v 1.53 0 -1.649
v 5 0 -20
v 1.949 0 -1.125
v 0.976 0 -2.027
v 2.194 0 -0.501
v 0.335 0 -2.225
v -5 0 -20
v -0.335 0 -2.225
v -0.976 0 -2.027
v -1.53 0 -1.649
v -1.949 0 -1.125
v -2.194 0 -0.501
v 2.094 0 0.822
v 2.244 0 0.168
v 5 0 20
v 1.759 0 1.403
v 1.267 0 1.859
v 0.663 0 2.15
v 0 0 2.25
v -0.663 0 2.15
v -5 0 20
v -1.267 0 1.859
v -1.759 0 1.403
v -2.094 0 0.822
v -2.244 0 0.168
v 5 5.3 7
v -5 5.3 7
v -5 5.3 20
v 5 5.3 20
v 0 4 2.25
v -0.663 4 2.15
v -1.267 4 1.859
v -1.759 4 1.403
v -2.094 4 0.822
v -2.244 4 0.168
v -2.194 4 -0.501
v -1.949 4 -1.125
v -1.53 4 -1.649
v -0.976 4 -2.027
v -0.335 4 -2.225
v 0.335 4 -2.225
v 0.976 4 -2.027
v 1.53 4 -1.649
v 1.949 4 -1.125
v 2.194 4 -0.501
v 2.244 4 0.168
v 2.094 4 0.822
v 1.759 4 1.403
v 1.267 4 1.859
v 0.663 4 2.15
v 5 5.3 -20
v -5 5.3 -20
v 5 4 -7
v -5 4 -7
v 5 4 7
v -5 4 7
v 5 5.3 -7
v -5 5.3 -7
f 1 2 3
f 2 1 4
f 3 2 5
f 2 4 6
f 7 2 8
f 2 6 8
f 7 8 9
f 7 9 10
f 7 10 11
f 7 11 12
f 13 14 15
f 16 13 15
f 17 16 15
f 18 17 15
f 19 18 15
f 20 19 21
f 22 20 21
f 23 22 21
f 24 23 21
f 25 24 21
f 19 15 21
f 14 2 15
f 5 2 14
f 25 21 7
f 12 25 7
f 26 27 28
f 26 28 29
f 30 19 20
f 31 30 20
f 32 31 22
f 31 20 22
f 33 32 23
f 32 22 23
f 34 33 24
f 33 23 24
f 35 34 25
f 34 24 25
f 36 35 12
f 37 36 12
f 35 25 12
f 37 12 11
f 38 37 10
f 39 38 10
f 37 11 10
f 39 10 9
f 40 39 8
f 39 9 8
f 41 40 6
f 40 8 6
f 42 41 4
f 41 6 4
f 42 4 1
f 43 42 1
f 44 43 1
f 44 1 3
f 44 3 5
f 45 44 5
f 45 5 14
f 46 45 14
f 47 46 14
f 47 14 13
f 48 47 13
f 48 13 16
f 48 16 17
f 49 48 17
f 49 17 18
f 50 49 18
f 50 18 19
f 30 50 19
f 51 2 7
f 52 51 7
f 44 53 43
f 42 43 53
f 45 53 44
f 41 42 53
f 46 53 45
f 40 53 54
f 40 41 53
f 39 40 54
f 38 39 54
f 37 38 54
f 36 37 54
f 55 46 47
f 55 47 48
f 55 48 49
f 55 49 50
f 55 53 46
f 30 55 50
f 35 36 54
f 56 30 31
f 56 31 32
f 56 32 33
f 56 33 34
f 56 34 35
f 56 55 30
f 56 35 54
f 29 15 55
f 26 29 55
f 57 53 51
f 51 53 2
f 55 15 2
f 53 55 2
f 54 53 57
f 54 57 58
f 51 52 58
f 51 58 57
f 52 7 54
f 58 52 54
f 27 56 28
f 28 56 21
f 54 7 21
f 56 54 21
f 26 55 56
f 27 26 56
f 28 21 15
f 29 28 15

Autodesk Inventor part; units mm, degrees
ref_plane "YZ Plane" through (0, 0, 0) normal (1, 0, 0) x (0, 1, 0)
ref_plane "XZ Plane" through (0, 0, 0) normal (0, 1, 0) x (-1, 0, 0)
ref_plane "XY Plane" through (0, 0, 0) normal (0, 0, 1) x (1, 0, 0)
sketch "Sketch1" plane through (0, 0, 0) normal (0, 1, 0) x (-1, 0, 0)
  line L0 (5, 20) -> (-5, 20)
  line L1 (-5, 20) -> (-5, -20)
  line L2 (-5, -20) -> (5, -20)
  line L3 (5, -20) -> (5, 20)
  point P0 (0, 0)
  point P1 (0, -20)
  point P2 (-5, 0)
  dimension "d0" = 10
  dimension "d1" = 40
extrude "Extrusion1" add sketch "Sketch1" along normal blind 4
sketch "Sketch2" plane through (0, 4, 0) normal (0, 1, 0) x (1, 0, 0)
  line L0 (-5, 20) -> (-5, -20) projected
  line L1 (5, -20) -> (5, 20) projected
  line L2 (-5, -20) -> (5, -20)
  line L3 (5, -20) -> (5, -7)
  line L4 (5, -7) -> (-5, -7)
  line L5 (-5, -7) -> (-5, -20)
  line L6 (5, 20) -> (-5, 20) projected
  line L7 (-5, 20) -> (5, 20)
  line L8 (5, 20) -> (5, 7)
  line L9 (5, 7) -> (-5, 7)
  line L10 (-5, 7) -> (-5, 20)
  point P0 (0, 0)
  dimension "d4" = 13
  dimension "d5" = 13
extrude "Extrusion2" add sketch "Sketch2" along normal blind 1.3 contours L6 L1 L9 L0 | L4 L1 L2 L0
sketch "Sketch3" plane through (0, 4, 0) normal (0, 1, 0) x (1, 0, 0)
  point P0 (0, 0)
  point P1 (0, 0)
hole "Hole1" at (0, 4, 0) direction (0, -1, 0) diameter 4.5 end through all
properties part number "Belt Clamp"
